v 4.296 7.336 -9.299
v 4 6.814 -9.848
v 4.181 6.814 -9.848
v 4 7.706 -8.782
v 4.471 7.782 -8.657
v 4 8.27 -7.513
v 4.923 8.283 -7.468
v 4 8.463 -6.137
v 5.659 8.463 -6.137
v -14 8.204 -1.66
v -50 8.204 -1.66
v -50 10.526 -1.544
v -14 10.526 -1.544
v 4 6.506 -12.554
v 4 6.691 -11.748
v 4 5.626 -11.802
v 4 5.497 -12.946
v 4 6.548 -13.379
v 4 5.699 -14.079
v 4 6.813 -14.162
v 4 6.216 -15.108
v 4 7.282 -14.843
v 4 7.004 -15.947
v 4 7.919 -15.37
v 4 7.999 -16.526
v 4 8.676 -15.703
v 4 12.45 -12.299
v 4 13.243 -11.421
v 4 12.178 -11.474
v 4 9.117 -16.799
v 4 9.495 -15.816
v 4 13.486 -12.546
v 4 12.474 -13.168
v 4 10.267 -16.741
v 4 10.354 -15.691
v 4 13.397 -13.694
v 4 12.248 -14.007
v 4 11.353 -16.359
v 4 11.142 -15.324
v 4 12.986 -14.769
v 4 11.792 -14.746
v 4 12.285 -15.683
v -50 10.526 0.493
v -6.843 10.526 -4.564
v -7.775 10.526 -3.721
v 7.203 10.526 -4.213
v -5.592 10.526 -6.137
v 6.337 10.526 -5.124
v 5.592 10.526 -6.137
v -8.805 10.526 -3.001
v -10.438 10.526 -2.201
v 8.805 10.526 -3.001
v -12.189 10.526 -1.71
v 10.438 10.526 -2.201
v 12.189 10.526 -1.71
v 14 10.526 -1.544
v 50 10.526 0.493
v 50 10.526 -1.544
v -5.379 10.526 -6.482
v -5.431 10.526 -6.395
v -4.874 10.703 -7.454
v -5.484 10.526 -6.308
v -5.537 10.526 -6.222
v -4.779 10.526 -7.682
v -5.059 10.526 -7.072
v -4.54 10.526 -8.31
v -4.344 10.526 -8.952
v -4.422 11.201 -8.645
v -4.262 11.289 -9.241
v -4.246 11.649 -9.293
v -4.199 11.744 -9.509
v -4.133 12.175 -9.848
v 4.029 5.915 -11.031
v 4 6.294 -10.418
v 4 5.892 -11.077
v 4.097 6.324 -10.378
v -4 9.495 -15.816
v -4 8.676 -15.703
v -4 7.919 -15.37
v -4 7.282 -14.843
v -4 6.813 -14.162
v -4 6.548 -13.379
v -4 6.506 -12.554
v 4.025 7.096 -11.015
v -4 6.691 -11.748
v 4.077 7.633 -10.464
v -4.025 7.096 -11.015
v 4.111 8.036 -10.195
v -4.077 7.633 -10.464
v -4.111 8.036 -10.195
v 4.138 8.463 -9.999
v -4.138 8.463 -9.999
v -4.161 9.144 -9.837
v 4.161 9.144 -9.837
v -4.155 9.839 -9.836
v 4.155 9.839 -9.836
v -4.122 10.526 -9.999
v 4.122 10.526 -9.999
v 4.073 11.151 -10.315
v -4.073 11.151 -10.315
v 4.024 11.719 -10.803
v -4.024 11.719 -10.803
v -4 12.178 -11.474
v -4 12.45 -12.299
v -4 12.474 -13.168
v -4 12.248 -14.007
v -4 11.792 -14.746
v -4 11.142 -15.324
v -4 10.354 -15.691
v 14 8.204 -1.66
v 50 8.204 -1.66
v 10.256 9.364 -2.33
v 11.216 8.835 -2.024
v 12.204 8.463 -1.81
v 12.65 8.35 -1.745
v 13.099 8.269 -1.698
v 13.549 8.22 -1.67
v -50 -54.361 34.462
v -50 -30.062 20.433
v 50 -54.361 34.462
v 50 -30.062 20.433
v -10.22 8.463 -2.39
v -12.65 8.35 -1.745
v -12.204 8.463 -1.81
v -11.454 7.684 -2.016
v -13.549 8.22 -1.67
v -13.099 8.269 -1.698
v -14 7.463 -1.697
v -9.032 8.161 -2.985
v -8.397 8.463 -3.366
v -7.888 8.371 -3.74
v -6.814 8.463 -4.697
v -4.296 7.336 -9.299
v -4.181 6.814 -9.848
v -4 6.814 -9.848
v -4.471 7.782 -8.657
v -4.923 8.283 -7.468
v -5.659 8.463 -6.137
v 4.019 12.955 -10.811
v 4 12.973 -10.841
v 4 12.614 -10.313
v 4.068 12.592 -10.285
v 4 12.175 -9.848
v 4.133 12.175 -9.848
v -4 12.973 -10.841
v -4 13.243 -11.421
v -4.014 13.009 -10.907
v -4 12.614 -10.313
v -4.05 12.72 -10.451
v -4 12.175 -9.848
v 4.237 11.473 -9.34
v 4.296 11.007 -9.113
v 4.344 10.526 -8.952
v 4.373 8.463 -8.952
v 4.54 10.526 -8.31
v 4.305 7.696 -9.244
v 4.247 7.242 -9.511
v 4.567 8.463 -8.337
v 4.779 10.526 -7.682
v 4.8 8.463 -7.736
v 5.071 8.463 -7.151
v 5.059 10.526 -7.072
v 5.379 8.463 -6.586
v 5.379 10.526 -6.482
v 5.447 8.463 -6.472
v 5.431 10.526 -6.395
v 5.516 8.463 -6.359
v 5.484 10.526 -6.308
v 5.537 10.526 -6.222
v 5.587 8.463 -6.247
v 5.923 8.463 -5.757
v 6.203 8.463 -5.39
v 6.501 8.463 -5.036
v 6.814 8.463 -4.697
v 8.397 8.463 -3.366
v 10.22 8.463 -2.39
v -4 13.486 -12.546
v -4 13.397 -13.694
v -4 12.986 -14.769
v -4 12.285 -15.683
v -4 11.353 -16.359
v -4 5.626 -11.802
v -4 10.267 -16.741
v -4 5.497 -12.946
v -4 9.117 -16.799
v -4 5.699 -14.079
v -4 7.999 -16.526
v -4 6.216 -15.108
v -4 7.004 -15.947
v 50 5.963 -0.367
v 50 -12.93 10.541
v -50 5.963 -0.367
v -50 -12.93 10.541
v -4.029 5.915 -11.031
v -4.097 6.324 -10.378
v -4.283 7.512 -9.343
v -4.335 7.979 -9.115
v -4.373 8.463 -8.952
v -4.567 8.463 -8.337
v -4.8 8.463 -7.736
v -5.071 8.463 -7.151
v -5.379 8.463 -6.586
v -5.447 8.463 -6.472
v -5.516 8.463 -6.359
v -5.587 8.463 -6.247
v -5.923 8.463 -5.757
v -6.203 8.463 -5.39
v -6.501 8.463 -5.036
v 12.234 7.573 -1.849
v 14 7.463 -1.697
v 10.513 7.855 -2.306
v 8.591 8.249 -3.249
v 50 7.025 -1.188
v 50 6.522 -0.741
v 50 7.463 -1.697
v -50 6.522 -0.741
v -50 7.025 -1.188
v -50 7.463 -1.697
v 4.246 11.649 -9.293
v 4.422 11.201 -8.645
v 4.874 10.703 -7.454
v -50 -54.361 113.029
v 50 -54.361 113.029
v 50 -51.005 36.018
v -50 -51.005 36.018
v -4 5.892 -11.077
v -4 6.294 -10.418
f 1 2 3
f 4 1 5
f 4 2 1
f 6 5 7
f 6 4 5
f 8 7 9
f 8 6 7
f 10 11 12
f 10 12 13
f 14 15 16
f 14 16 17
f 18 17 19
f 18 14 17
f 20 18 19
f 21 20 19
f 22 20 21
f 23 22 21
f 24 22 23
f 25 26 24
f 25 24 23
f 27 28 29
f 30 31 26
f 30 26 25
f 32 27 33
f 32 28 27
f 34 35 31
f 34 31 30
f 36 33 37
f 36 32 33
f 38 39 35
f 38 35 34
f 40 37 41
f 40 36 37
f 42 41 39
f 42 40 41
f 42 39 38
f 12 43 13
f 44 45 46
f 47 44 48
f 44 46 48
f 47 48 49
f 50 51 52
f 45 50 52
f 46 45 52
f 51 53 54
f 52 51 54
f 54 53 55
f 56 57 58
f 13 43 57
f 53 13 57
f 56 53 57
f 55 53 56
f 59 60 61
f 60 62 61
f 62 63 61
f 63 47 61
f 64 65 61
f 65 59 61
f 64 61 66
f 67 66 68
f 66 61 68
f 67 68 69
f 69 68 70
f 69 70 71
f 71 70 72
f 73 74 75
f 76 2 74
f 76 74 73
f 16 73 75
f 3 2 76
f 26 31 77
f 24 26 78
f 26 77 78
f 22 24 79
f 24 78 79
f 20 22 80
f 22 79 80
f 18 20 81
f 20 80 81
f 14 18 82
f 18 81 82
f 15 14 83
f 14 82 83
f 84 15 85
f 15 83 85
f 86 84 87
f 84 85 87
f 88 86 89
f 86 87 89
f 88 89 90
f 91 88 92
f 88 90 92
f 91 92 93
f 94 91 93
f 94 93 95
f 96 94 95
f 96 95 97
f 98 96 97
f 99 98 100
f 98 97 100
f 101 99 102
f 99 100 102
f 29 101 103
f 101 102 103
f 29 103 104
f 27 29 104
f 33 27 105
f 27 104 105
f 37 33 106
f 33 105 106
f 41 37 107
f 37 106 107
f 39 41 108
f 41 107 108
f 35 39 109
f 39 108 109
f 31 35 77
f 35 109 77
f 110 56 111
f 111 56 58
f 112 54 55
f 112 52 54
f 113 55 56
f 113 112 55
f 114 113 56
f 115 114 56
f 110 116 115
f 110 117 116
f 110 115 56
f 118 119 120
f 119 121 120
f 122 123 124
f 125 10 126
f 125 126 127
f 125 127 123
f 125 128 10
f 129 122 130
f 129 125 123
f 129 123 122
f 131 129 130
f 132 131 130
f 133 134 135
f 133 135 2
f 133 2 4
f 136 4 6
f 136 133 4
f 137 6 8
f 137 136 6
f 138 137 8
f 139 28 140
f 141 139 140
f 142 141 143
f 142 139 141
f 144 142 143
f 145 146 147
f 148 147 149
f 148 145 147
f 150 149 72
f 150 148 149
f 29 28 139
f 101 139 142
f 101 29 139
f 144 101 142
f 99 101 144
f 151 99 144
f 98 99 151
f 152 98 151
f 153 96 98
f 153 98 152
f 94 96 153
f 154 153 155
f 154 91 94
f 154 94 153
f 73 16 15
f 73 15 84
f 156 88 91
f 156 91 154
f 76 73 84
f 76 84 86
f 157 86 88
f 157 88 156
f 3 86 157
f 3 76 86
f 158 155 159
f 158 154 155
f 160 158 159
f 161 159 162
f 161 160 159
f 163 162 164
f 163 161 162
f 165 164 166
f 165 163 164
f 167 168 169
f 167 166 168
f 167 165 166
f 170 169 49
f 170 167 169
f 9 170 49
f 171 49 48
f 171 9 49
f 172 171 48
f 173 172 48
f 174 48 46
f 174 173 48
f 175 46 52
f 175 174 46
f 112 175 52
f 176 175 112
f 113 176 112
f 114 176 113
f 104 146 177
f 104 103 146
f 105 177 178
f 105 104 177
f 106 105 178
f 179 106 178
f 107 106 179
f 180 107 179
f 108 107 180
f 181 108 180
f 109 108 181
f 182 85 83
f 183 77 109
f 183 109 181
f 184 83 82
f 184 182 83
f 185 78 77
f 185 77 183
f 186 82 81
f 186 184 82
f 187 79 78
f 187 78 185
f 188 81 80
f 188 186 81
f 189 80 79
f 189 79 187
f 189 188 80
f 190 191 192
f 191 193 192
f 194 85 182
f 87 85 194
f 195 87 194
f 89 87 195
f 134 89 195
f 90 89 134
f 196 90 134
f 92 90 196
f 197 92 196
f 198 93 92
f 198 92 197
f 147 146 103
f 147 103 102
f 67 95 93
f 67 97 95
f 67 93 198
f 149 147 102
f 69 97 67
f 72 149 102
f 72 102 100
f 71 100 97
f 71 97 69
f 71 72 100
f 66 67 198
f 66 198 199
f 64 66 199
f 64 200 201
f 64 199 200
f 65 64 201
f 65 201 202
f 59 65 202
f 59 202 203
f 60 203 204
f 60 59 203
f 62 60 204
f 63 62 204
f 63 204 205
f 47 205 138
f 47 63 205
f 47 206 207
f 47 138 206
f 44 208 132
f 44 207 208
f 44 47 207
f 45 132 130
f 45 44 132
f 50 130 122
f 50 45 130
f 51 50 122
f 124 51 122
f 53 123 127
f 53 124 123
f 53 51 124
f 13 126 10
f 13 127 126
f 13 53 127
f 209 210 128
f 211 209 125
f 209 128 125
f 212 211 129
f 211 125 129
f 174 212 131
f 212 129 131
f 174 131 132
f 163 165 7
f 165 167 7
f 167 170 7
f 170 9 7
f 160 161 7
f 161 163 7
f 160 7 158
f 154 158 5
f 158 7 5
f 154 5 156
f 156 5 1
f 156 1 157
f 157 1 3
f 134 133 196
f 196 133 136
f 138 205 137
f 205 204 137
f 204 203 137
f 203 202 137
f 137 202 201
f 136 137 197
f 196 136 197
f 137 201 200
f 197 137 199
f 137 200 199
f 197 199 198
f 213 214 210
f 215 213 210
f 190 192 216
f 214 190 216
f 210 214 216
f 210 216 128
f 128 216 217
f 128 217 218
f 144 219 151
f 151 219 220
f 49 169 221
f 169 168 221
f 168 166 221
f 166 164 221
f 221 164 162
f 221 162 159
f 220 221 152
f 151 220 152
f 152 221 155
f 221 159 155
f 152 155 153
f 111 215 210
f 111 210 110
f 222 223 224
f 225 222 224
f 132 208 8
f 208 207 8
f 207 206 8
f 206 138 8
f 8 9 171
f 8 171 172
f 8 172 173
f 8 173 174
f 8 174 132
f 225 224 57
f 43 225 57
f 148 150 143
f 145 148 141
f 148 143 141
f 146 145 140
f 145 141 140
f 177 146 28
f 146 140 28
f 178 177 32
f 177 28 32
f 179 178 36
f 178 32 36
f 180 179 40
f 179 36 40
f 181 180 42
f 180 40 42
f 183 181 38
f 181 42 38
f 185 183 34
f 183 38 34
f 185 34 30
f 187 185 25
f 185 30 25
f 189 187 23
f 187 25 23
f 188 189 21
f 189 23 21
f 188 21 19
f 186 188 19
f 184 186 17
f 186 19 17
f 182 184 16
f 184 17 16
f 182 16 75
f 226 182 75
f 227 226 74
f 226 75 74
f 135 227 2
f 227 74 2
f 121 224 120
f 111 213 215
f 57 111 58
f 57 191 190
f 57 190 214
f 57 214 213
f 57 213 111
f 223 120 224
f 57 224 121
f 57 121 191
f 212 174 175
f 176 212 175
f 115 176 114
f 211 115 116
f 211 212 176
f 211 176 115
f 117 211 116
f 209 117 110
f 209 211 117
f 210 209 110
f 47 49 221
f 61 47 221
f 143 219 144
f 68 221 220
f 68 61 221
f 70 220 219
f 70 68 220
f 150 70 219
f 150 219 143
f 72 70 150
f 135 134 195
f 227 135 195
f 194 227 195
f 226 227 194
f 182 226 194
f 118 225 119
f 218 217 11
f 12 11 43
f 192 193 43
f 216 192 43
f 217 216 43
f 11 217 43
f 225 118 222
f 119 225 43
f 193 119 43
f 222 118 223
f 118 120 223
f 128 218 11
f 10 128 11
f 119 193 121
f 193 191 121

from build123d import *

# Parameters (mm, degrees)
SKETCH1_R           = 3
BOSS_EXTRUDE1_DEPTH = 50
SKETCH2_W           = 49.237563161
SKETCH2_H           = 20.165956609
CUT_EXTRUDE1_DEPTH  = 35
FILLET1_R           = 10
FILLET3_START       = -50
FILLET3_DEPTH       = 100
FILLET3_START_2     = -14.0000001
FILLET3_2_DEPTH     = 28.0000001
FILLET3_START_3     = 5.029081153
FILLET3_3_DEPTH     = 7.627254367
FILLET4_R           = 5


with BuildPart() as part:
    # Sketch1 → Boss-Extrude1 (new, symmetric)
    with BuildSketch(Plane(origin=(0, 0, 0), x_dir=(0, 0, -1), z_dir=(1, 0, 0))):
        with BuildLine():
            Line((8.951712986, 8.463111178), (1.809964066, 8.463111178))
            Line((1.809964066, 8.463111178), (-10.541427431, -12.930126439))
            Line((-10.541427431, -12.930126439), (-20.432636562, -30.062203202))
            Line((-20.432636562, -30.062203202), (-34.461620266, -54.361115756))
            Line((-34.461620266, -54.361115756), (-113.02909109, -54.361115756))
            Line((-113.02909109, -54.361115756), (-36.018105083, -51.005100845))
            Line((-36.018105083, -51.005100845), (-0.492985983, 10.526210382))
            Line((-0.492985983, 10.526210382), (8.951712986, 10.526210382))
            ThreePointArc((8.951712986, 10.526210382), (16.816412899, 9.49466078), (8.951712986, 8.463111178))
        make_face()
        with Locations((12.816412899, 9.49466078)):
            Circle(SKETCH1_R, mode=Mode.SUBTRACT)
    extrude(amount=BOSS_EXTRUDE1_DEPTH, both=True)

    # Sketch2 → Cut-Extrude1 (cut, symmetric)
    with BuildSketch(Plane(origin=(0, -11.420787425, -0.571112862), x_dir=(1, 0, 0), z_dir=(0, 0.9987520183198841, 0.04994402769058576))):
        Polygon((-41.345711691, -80.976381383), (-37.345711691, -80.976381383), (-37.345711691, -96.642858944), (-33.68226718, -102.621642139), (-29.345711691, -96.642858944), (-29.345711691, -80.976381383), (-25.345711691, -80.976381383), (-25.345711691, -96.642858944), (-21.68226718, -102.621642139), (-17.345711691, -96.642858944), (-17.345711691, -80.976381383), (-13.345711691, -80.976381383), (-13.345711691, -96.642858944), (-9.68226718, -102.621642139), (-5.345711691, -96.642858944), (-5.345711691, -80.976381383), (-1.345711691, -80.976381383), (-1.345711691, -96.642858944), (2.31773282, -102.621642139), (6.654288309, -96.642858944), (6.654288309, -80.976381383), (10.654288309, -80.976381383), (10.654288309, -96.642858944), (14.31773282, -102.621642139), (18.654288309, -96.642858944), (18.654288309, -80.976381383), (22.654288309, -80.976381383), (22.654288309, -96.642858944), (26.31773282, -102.621642139), (30.654288309, -96.642858944), (30.654288309, -80.976381383), (34.654288309, -80.976381383), (34.654288309, -96.642858944), (38.31773282, -102.621642139), (42.654288309, -96.642858944), (42.654288309, -80.976381383), (46.654288309, -80.976381383), (46.654288309, -96.642858944), (50.31773282, -102.621642139), (54.654288309, -96.642858944), (54.654288309, -80.976381383), (58.654288309, -80.976381383), (58.654288309, -96.642858944), (58.654288309, -117.647520094), (-58.342792285, -117.647520094), (-58.342792285, -96.642858944), (-49.345711691, -96.642858944), (-45.68226718, -102.621642139), (-41.345711691, -96.642858944), align=None)
        with Locations((-28.618781581, 12.150846953)):
            Rectangle(SKETCH2_W, SKETCH2_H)
        with Locations((28.618781581, 12.150846953)):
            Rectangle(SKETCH2_W, SKETCH2_H)
    extrude(amount=CUT_EXTRUDE1_DEPTH, both=True, mode=Mode.SUBTRACT)

    # Fillet1
    # the kernel refuses this fillet: 10 mm, written as the material it adds along each edge
    with BuildSketch(Plane(origin=(-4, 35.49501084, -0.295473589), x_dir=(0, 0.049944027690585764, -0.9987520183198841), z_dir=(0, -0.9987520183198841, -0.04994402769058576))) as fillet1_piece_1_section:
        with BuildLine():
            CenterArc((FILLET1_R, -FILLET1_R), FILLET1_R, 90, 90)
            Line((0, -FILLET1_R), (0, 0))
            Line((0, 0), (FILLET1_R, 0))
        make_face()
    fillet1_piece_1 = extrude(amount=52.325377672, mode=Mode.PRIVATE)
    fillet1_piece_1 = split(fillet1_piece_1, bisect_by=Plane(origin=(-4, 8.463111178, -0.295473589), z_dir=(0, 1, 0)), keep=Keep.TOP, mode=Mode.PRIVATE)
    fillet1_piece_1 = split(fillet1_piece_1, bisect_by=Plane(origin=(-4, 10.526210382, -0.295473589), z_dir=(0, -1, 0)), keep=Keep.TOP, mode=Mode.PRIVATE)
    fillet1_piece_1 = fillet1_piece_1 - Plane(origin=(-4, 9.49466078, -12.816412899), x_dir=(0, 0, -1), z_dir=(-1, 0, 0)) * Cylinder(3, 145, mode=Mode.PRIVATE)
    add(fillet1_piece_1)
    with BuildSketch(Plane(origin=(-4, 35.49501084, -0.295473589), x_dir=(0, 0.049944027690585764, -0.9987520183198841), z_dir=(0, -0.9987520183198841, -0.04994402769058576))) as fillet1_piece_2_section:
        with BuildLine():
            CenterArc((FILLET1_R, -FILLET1_R), FILLET1_R, 90, 90)
            Line((0, -FILLET1_R), (0, 0))
            Line((0, 0), (FILLET1_R, 0))
        make_face()
    fillet1_piece_2 = extrude(amount=52.325377672, mode=Mode.PRIVATE)
    fillet1_piece_2 = split(fillet1_piece_2, bisect_by=Plane(origin=(-4, 28.081242311, -13.136497357), z_dir=(0, 0.4999999999999977, 0.8660254037844399)), keep=Keep.TOP, mode=Mode.PRIVATE)
    fillet1_piece_2 = split(fillet1_piece_2, bisect_by=Plane(origin=(-4, 10.526210382, -0.295473589), z_dir=(0, -1, 0)), keep=Keep.TOP, mode=Mode.PRIVATE)
    add(fillet1_piece_2)
    with BuildSketch(Plane(origin=(-4, 35.49501084, -0.295473589), x_dir=(0, 0.049944027690585764, -0.9987520183198841), z_dir=(0, -0.9987520183198841, -0.04994402769058576))) as fillet1_piece_3_section:
        with BuildLine():
            CenterArc((FILLET1_R, -FILLET1_R), FILLET1_R, 90, 90)
            Line((0, -FILLET1_R), (0, 0))
            Line((0, 0), (FILLET1_R, 0))
        make_face()
    fillet1_piece_3 = extrude(amount=52.325377672, mode=Mode.PRIVATE)
    fillet1_piece_3 = fillet1_piece_3 & Plane(origin=(-4, 9.49466078, -12.816412899), x_dir=(0, 0.2578874004491323, 0.9661749782982318), z_dir=(1, 0, 0)) * Cylinder(4, 145, mode=Mode.PRIVATE)
    fillet1_piece_3 = fillet1_piece_3 - Plane(origin=(-4, 9.49466078, -12.816412899), x_dir=(0, 0, -1), z_dir=(-1, 0, 0)) * Cylinder(3, 145, mode=Mode.PRIVATE)
    add(fillet1_piece_3)
    with BuildSketch(Plane(origin=(4, -16.76506572, -2.908813701), x_dir=(0, 0.049944027690585764, -0.9987520183198841), z_dir=(0, 0.9987520183198841, 0.04994402769058576))) as fillet1_piece_4_section:
        with BuildLine():
            CenterArc((FILLET1_R, -FILLET1_R), FILLET1_R, 90, 90)
            Line((0, -FILLET1_R), (0, 0))
            Line((0, 0), (FILLET1_R, 0))
        make_face()
    fillet1_piece_4 = extrude(amount=52.325377672, mode=Mode.PRIVATE)
    fillet1_piece_4 = split(fillet1_piece_4, bisect_by=Plane(origin=(4, -9.982205646, 8.839444568), z_dir=(0, 0.4999999999999977, 0.8660254037844399)), keep=Keep.TOP, mode=Mode.PRIVATE)
    fillet1_piece_4 = split(fillet1_piece_4, bisect_by=Plane(origin=(4, 10.526210382, -2.908813701), z_dir=(0, -1, 0)), keep=Keep.TOP, mode=Mode.PRIVATE)
    add(fillet1_piece_4)
    with BuildSketch(Plane(origin=(4, -16.76506572, -2.908813701), x_dir=(0, 0.049944027690585764, -0.9987520183198841), z_dir=(0, 0.9987520183198841, 0.04994402769058576))) as fillet1_piece_5_section:
        with BuildLine():
            CenterArc((FILLET1_R, -FILLET1_R), FILLET1_R, 90, 90)
            Line((0, -FILLET1_R), (0, 0))
            Line((0, 0), (FILLET1_R, 0))
        make_face()
    fillet1_piece_5 = extrude(amount=52.325377672, mode=Mode.PRIVATE)
    fillet1_piece_5 = split(fillet1_piece_5, bisect_by=Plane(origin=(4, 8.463111178, -2.908813701), z_dir=(0, 1, 0)), keep=Keep.TOP, mode=Mode.PRIVATE)
    fillet1_piece_5 = split(fillet1_piece_5, bisect_by=Plane(origin=(4, 10.526210382, -2.908813701), z_dir=(0, -1, 0)), keep=Keep.TOP, mode=Mode.PRIVATE)
    fillet1_piece_5 = fillet1_piece_5 - Plane(origin=(4, 9.49466078, -12.816412899), x_dir=(0, 0, -1), z_dir=(-1, 0, 0)) * Cylinder(3, 145, mode=Mode.PRIVATE)
    add(fillet1_piece_5)
    with BuildSketch(Plane(origin=(4, -16.76506572, -2.908813701), x_dir=(0, 0.049944027690585764, -0.9987520183198841), z_dir=(0, 0.9987520183198841, 0.04994402769058576))) as fillet1_piece_6_section:
        with BuildLine():
            CenterArc((FILLET1_R, -FILLET1_R), FILLET1_R, 90, 90)
            Line((0, -FILLET1_R), (0, 0))
            Line((0, 0), (FILLET1_R, 0))
        make_face()
    fillet1_piece_6 = extrude(amount=52.325377672, mode=Mode.PRIVATE)
    fillet1_piece_6 = fillet1_piece_6 & Plane(origin=(4, 9.49466078, -12.816412899), x_dir=(0, 0.2578874004491323, 0.9661749782982318), z_dir=(1, 0, 0)) * Cylinder(4, 145, mode=Mode.PRIVATE)
    fillet1_piece_6 = fillet1_piece_6 - Plane(origin=(4, 9.49466078, -12.816412899), x_dir=(0, 0, -1), z_dir=(-1, 0, 0)) * Cylinder(3, 145, mode=Mode.PRIVATE)
    add(fillet1_piece_6)

    # Fillet3: read off the stored shape, not the designer's step
    # Fillet3 outline → Fillet3 (add)
    with BuildSketch(Plane.YZ.offset(FILLET3_START)):
        with BuildLine():
            Line((7.463496818, -1.697229668), (8.203734738, -1.660213009))
            Line((8.203734738, -1.660213009), (5.963111178, -0.366588393))
            ThreePointArc((5.963111178, -0.366588393), (6.780701406, -0.955914016), (7.463496818, -1.697229668))
        make_face()
    extrude(amount=FILLET3_DEPTH)

    # Fillet3 2 outline → Fillet3 2 (add)
    with BuildSketch(Plane.YZ.offset(FILLET3_START_2)):
        with BuildLine():
            Line((8.463111178, -1.809964066), (8.203734738, -1.660213009))
            Line((8.203734738, -1.660213009), (7.463496818, -1.697229668))
            ThreePointArc((7.463496818, -1.697229668), (8.206629292, -3.115881487), (8.463111178, -4.696715412))
            Line((8.463111178, -4.696715412), (8.463111178, -1.809964066))
        make_face()
    extrude(amount=FILLET3_2_DEPTH)

    # Fillet3 3 outline → Fillet3 3 (cut)
    with BuildSketch(Plane(origin=(0, 0, 0), x_dir=(1, 0, 0), z_dir=(0, 0.998752018319884, 0.0499440276905858)).offset(FILLET3_START_3)):
        with BuildLine():
            ThreePointArc((-14, 2.067868648), (-9.034050266, 3.38804473), (-5.379286145, 7))
            Line((-5.379286145, 7), (-14.0000001, 7))
            Line((-14.0000001, 7), (-14, 2.067868648))
        make_face()
        with BuildLine():
            Line((14, 7), (5.379286145, 7))
            ThreePointArc((5.379286145, 7), (9.034050266, 3.38804473), (14, 2.067868648))
            Line((14, 2.067868648), (14, 7))
        make_face()
    extrude(amount=FILLET3_3_DEPTH, mode=Mode.SUBTRACT)

    # Fillet4
    # the kernel refuses this fillet: 5 mm, written as the material it adds along each edge
    with BuildSketch(Plane(origin=(-11.410578331, 8.463111178, -8.951712972), x_dir=(-4.3911864757766885e-10, -0.8787125753545649, -0.47735124375426957), z_dir=(1.0, 9.37113186758836e-13, -9.216318308073321e-10))) as fillet4_piece_1_section:
        with BuildLine():
            CenterArc((3.049747005, -4.860464878), FILLET4_R, 103.567804979, 47.919645029)
            Line((-1.343815871, -2.473708659), (0, 0))
            ThreePointArc((0, 0), (0.938383697, -0.111628098), (1.876767394, 0))
        make_face()
    fillet4_piece_1 = extrude(amount=15.410578331, mode=Mode.PRIVATE)
    fillet4_piece_1 = fillet4_piece_1 - Plane(origin=(-14, 8.598192062, -11.652983015), x_dir=(0, 0.04994402769099318, -0.9987520183198637), z_dir=(0, 0.9987520183198637, 0.04994402769099318)) * Cylinder(10, 41, mode=Mode.PRIVATE)
    add(fillet4_piece_1)
    with BuildSketch(Plane(origin=(-11.382224103, 10.526210382, -8.951712986), x_dir=(4.174135827959178e-15, 0.8787125762173496, -0.47735124216604746), z_dir=(1, 0, 0))) as fillet4_piece_2_section:
        with BuildLine():
            CenterArc((3.049747012, 4.860464876), FILLET4_R, 208.512549888, 47.919645029)
            Line((-1.343815869, 2.473708665), (0, 0))
            ThreePointArc((0, 0), (0.938383696, 0.111628099), (1.876767392, 0))
        make_face()
    fillet4_piece_2 = extrude(amount=22.764448206, mode=Mode.PRIVATE)
    fillet4_piece_2 = fillet4_piece_2 - Plane(origin=(14, 10.656145058, -11.550072123), x_dir=(0, 0.04994402769099318, -0.9987520183198637), z_dir=(0, -0.9987520183198637, -0.04994402769099318)) * Cylinder(10, 56, mode=Mode.PRIVATE)
    fillet4_piece_2 = fillet4_piece_2 - Plane(origin=(-14, 10.656145058, -11.550072123), x_dir=(0, 0.04994402769099318, -0.9987520183198637), z_dir=(0, 0.9987520183198637, 0.04994402769099318)) * Cylinder(10, 56, mode=Mode.PRIVATE)
    add(fillet4_piece_2)
    with BuildSketch(Plane(origin=(4, 8.463111178, -8.951712986), x_dir=(0, -0.8787125762172517, -0.4773512421662278), z_dir=(1, 0, 0))) as fillet4_piece_3_section:
        with BuildLine():
            CenterArc((3.049747012, -4.860464876), FILLET4_R, 103.567805083, 47.919645029)
            Line((-1.343815869, -2.473708665), (0, 0))
            ThreePointArc((0, 0), (0.938383696, -0.111628099), (1.876767392, 0))
        make_face()
    fillet4_piece_3 = extrude(amount=7.41057834, mode=Mode.PRIVATE)
    fillet4_piece_3 = fillet4_piece_3 - Plane(origin=(14, 8.598192062, -11.652983015), x_dir=(0, 0.04994402769099318, -0.9987520183198637), z_dir=(0, -0.9987520183198637, -0.04994402769099318)) * Cylinder(10, 25, mode=Mode.PRIVATE)
    add(fillet4_piece_3)


solid = part.part
